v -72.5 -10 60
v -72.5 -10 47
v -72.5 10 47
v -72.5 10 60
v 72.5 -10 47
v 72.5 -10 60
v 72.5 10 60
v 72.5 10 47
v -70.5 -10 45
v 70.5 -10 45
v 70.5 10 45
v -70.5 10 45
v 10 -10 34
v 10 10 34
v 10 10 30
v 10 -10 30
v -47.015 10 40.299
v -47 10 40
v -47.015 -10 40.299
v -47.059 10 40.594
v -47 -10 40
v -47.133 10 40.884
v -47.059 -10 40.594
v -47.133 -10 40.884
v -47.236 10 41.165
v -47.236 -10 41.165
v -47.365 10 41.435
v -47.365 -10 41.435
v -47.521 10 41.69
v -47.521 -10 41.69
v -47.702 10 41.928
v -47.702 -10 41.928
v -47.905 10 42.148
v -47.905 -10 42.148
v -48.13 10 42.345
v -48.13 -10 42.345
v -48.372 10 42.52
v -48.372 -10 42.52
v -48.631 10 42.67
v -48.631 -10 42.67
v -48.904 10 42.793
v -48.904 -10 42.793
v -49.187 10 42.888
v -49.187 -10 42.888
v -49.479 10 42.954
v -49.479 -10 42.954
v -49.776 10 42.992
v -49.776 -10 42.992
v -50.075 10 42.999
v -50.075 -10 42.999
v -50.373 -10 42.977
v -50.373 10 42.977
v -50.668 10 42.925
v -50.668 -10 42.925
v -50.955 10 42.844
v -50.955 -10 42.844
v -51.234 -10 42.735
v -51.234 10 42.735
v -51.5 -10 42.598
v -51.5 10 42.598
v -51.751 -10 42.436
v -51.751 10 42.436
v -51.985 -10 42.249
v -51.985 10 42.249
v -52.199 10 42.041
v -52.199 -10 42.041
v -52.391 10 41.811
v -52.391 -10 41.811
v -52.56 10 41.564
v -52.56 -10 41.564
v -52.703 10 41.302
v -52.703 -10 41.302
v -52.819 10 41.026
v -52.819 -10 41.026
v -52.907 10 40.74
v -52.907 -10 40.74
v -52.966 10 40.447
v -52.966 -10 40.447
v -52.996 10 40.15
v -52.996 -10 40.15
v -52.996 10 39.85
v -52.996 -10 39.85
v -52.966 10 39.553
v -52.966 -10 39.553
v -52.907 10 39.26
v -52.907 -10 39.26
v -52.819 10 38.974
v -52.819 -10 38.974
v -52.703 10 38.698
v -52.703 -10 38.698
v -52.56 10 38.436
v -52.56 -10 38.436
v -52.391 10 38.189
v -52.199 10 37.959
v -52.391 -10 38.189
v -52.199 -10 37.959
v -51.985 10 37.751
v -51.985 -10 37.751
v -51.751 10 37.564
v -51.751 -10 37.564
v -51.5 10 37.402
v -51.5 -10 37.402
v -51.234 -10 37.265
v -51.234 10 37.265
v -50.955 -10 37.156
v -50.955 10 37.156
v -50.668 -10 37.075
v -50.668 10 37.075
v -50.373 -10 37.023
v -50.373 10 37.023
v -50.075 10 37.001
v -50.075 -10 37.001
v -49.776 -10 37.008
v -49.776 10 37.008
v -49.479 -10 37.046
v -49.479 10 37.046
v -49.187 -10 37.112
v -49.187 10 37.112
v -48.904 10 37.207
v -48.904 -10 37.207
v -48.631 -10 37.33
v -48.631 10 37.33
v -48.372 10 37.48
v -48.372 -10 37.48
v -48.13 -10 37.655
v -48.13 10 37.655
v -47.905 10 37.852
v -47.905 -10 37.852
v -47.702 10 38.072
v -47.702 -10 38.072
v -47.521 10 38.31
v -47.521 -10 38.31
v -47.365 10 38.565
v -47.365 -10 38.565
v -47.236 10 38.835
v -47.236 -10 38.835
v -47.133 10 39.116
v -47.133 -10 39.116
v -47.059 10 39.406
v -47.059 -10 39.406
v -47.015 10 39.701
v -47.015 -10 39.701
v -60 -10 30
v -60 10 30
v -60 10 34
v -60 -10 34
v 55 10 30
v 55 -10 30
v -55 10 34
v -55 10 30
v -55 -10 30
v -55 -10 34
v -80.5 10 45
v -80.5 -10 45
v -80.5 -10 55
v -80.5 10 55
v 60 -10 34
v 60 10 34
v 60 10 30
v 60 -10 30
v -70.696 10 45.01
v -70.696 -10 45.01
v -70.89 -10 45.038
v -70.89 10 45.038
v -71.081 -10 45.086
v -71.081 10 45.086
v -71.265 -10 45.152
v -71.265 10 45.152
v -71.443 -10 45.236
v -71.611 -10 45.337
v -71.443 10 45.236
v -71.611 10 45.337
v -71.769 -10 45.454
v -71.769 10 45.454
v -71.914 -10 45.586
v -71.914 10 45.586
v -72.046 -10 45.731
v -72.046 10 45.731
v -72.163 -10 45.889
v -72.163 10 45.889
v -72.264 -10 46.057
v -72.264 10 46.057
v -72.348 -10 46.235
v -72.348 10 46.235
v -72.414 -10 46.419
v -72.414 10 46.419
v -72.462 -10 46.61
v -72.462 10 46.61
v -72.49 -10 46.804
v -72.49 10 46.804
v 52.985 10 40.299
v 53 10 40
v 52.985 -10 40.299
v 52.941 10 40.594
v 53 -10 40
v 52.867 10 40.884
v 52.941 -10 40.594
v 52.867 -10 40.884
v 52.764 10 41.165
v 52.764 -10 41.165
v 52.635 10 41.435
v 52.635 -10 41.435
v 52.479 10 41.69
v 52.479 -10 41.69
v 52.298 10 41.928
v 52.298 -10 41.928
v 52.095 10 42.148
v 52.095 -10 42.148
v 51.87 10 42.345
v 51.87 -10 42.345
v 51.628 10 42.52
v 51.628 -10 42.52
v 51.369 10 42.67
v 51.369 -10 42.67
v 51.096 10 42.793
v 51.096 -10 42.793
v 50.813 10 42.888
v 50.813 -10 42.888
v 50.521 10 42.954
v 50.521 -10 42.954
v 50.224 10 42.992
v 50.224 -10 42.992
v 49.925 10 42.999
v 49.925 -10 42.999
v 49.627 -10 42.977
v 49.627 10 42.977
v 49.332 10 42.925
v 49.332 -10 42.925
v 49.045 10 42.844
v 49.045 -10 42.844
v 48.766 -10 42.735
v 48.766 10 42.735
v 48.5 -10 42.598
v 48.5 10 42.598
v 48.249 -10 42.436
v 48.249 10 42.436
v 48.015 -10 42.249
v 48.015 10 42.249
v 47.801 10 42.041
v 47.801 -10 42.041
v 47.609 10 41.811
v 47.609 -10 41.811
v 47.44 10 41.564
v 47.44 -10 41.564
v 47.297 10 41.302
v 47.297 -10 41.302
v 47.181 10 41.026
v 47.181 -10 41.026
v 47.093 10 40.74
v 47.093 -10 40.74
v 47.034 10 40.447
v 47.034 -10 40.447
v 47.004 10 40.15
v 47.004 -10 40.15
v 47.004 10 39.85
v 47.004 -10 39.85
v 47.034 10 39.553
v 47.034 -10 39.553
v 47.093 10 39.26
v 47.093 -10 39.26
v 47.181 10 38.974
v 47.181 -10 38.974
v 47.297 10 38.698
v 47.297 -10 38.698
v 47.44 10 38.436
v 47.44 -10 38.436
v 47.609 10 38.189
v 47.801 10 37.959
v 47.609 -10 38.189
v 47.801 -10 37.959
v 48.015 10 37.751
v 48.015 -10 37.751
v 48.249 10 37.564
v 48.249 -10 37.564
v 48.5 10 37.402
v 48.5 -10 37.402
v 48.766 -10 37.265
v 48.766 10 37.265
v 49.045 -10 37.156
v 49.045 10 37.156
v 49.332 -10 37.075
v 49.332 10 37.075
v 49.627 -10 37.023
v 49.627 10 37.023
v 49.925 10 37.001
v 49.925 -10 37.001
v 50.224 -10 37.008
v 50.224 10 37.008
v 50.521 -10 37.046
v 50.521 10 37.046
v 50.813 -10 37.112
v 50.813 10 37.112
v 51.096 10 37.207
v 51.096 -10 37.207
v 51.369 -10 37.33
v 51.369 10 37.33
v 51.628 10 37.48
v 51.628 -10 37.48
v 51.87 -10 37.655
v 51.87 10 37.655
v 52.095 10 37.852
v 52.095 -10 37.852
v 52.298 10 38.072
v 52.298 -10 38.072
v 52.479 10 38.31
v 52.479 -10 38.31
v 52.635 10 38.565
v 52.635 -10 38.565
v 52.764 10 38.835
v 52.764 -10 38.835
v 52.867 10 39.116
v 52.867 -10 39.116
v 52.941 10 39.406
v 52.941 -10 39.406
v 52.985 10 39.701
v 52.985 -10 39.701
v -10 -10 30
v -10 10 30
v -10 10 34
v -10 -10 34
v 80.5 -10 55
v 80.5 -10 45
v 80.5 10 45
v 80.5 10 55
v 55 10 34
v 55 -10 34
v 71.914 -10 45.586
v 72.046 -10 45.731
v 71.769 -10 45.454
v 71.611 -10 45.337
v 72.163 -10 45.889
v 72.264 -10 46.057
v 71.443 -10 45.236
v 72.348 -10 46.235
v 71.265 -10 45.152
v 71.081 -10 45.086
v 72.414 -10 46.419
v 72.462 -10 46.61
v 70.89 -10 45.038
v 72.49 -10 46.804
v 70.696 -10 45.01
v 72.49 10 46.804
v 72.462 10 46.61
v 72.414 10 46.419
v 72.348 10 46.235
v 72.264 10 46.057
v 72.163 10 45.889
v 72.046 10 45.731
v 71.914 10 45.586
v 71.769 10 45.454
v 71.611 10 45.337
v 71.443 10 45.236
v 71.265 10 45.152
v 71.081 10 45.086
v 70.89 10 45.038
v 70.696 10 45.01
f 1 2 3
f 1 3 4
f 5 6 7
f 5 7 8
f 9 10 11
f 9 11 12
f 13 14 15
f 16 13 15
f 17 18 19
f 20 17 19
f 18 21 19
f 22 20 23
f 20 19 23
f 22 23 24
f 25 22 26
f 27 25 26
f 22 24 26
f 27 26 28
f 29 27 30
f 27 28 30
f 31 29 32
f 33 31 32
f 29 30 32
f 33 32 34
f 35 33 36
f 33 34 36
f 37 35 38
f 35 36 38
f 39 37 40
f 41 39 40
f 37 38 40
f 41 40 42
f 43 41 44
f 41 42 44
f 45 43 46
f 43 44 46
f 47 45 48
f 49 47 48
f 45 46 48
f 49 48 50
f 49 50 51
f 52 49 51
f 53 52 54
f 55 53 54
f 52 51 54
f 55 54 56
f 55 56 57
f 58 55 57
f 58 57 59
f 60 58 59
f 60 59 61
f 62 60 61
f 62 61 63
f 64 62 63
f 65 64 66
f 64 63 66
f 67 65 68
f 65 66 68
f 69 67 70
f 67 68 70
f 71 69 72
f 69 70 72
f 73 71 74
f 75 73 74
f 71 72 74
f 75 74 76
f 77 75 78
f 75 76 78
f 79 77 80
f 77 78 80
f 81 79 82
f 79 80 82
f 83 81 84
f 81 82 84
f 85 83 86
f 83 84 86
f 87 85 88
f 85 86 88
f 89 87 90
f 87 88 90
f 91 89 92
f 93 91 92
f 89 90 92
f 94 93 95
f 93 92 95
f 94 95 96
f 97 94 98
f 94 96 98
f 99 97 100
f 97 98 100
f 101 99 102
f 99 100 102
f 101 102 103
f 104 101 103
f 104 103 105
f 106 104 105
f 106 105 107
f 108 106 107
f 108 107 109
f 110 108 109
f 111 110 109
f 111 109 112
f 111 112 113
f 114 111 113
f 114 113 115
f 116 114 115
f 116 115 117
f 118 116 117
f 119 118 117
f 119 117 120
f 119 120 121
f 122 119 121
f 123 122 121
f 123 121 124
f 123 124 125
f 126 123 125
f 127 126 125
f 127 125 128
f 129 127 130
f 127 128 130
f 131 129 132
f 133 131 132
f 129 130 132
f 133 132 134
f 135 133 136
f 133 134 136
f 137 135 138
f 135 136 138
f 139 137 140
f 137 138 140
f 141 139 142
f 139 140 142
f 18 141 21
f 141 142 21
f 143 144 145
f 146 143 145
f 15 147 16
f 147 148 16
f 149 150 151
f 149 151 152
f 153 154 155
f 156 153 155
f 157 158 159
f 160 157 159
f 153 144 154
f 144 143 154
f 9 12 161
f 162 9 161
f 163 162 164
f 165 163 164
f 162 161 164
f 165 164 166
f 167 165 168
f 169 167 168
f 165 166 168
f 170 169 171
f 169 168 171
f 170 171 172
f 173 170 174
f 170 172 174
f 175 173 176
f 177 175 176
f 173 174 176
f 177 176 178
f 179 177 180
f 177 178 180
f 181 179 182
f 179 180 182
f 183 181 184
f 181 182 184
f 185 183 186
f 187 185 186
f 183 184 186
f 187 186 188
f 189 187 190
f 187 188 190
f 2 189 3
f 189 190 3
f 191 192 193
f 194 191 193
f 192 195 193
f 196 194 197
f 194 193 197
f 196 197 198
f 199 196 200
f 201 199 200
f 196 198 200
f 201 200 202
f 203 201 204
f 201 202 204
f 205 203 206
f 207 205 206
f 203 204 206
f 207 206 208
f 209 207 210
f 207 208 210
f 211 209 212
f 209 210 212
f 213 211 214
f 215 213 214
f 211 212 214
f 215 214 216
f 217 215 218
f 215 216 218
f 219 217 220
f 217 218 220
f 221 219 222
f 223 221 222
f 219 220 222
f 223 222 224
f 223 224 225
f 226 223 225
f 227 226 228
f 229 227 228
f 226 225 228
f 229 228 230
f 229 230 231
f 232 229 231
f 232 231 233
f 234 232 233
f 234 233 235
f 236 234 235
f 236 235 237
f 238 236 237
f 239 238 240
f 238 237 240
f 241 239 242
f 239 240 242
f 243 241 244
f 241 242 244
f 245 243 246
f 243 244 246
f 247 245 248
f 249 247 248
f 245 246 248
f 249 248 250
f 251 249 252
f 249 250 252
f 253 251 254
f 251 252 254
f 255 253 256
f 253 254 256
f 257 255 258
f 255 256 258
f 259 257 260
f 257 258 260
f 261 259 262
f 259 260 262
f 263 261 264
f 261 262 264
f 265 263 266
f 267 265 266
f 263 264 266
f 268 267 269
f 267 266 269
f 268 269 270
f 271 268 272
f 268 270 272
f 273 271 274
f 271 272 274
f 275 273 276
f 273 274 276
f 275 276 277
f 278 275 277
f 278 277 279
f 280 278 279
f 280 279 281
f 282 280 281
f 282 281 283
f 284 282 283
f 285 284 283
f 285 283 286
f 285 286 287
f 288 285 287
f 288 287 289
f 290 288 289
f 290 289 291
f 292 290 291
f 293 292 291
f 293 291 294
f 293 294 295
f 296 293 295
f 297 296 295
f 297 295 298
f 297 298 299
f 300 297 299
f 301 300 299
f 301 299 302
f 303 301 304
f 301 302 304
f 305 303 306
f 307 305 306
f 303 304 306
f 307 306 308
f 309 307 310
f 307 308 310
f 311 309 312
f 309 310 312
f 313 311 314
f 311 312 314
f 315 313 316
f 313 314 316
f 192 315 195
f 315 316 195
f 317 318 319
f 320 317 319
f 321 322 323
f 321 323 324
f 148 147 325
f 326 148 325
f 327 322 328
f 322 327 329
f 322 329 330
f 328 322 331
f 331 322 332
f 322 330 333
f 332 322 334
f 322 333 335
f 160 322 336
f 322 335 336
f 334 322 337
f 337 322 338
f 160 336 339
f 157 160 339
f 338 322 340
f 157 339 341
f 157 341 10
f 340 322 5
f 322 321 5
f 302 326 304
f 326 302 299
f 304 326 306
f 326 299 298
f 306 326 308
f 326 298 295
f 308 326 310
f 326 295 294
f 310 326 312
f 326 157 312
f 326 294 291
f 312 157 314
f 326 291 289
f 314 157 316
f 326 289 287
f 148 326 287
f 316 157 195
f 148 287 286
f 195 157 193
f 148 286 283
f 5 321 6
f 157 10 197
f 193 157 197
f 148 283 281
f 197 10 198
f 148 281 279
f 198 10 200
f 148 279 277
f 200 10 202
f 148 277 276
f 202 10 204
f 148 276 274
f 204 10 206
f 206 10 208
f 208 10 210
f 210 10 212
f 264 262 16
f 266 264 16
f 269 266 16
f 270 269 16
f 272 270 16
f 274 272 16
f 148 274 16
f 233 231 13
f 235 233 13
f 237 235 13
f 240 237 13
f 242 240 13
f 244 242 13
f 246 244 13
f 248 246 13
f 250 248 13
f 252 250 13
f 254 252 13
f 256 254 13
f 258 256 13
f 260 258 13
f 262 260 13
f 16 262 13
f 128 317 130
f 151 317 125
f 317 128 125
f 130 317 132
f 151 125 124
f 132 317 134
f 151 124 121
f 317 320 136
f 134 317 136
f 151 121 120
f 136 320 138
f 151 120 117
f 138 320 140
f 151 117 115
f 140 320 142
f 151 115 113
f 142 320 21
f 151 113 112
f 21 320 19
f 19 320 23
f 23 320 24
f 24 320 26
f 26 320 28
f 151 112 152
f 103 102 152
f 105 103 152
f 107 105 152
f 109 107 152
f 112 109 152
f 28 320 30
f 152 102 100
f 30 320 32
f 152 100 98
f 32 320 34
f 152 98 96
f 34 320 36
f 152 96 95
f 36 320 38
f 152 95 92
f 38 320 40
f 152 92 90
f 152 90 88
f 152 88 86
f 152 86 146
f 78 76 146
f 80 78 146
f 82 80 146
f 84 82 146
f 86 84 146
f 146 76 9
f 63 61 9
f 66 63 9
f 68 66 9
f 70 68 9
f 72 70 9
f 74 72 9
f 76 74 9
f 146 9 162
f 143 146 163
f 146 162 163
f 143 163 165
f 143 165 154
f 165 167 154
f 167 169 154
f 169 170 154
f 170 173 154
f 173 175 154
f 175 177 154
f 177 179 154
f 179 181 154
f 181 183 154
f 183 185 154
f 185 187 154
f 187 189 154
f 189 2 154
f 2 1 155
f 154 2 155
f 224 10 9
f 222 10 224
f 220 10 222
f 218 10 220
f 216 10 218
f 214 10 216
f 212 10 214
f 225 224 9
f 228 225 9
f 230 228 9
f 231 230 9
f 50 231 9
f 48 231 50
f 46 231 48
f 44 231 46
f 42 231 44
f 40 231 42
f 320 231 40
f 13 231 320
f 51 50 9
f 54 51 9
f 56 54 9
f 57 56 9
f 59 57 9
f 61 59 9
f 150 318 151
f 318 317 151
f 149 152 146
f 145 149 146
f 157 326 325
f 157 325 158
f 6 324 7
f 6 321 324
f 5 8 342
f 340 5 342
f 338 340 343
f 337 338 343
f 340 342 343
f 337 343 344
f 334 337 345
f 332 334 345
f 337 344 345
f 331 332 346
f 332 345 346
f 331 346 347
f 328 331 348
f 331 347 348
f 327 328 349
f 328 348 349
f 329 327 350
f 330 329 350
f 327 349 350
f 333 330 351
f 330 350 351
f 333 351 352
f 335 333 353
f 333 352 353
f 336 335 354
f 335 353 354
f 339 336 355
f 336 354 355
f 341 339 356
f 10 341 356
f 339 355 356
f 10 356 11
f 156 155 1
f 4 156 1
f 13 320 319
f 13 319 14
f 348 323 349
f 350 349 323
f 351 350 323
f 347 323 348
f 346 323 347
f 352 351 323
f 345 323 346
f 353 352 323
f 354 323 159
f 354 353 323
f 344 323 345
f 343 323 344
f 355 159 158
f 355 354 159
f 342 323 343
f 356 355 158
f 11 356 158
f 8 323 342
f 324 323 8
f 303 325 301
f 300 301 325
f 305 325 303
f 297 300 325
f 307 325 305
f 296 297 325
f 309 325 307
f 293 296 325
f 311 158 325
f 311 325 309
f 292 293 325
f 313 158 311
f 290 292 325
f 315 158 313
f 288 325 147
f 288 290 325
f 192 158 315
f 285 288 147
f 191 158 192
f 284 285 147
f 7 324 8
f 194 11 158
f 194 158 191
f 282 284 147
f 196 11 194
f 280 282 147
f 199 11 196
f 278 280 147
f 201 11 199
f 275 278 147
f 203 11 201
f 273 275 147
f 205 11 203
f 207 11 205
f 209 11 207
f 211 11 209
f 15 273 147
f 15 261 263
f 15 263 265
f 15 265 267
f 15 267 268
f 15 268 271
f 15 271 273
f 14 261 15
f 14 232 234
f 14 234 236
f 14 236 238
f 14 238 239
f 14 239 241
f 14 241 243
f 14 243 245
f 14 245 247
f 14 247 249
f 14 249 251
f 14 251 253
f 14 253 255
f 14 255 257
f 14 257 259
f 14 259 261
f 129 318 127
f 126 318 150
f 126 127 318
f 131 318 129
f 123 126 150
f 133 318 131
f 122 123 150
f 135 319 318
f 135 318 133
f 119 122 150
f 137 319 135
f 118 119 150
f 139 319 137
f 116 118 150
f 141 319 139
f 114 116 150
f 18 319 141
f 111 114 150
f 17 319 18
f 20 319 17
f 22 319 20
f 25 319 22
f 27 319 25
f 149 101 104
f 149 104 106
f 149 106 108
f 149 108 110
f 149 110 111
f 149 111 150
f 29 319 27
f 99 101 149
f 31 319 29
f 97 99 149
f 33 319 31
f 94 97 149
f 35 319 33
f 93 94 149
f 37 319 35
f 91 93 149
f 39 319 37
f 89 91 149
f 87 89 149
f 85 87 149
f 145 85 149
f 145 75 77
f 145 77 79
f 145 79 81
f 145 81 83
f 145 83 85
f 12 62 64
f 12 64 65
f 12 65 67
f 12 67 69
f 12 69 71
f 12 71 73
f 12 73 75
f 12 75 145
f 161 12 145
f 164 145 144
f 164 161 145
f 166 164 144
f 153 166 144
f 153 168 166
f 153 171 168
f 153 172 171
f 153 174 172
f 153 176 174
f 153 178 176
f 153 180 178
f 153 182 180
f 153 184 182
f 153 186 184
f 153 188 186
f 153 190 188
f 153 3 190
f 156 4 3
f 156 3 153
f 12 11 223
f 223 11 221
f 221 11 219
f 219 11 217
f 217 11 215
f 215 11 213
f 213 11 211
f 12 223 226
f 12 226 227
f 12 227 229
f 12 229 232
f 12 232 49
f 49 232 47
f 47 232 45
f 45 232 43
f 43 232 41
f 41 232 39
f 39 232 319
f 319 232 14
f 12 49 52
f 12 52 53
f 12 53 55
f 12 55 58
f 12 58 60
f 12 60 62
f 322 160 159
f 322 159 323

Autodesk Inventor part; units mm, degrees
ref_plane "YZ Plane" through (0, 0, 0) normal (1, 0, 0) x (0, 1, 0)
ref_plane "XZ Plane" through (0, 0, 0) normal (0, 1, 0) x (-1, 0, 0)
ref_plane "XY Plane" through (0, 0, 0) normal (0, 0, 1) x (1, 0, 0)
sketch "Esquisse1" plane through (0, 0, 0) normal (0, 1, 0) x (-1, 0, 0)
  circle A0 centre (0, 0) radius 25 construction
  line L0 (-25, 0) -> (25, 0) construction
  arc A1 (-75, -80.7775) -> (-75, 80.7775) centre (-25, 0) ccw construction
  arc A2 (75, 80.7775) -> (75, -80.7775) centre (25, 0) ccw construction
  line L1 (0, 25) -> (0, 0) construction
  line L2 (-75, 80.7775) -> (75, 80.7775)
  line L3 (-75, -80.7775) -> (75, -80.7775)
  arc A3 (75, -80.7775) -> (75, 80.7775) centre (25, 0) ccw
  arc A4 (-75, 80.7775) -> (-75, -80.7775) centre (-25, 0) ccw
  dimension "d0" = 50
  dimension "d1" = 190
  dimension "d2" = 150
extrude "Extrusion1" add sketch "Esquisse1" along normal mid plane 20
sketch "Esquisse4" plane through (0, -10, 0) normal (0, -1, 0) x (1, 0, 0)
  line L0 (-50, 40) -> (50, 40) construction
  line L1 (50, 40) -> (50, -40) construction
  line L2 (50, -40) -> (-50, -40) construction
  line L3 (-50, -40) -> (-50, 40) construction
  circle A0 centre (-50, 40) radius 3
  circle A1 centre (50, 40) radius 3
  circle A2 centre (50, -40) radius 3
  circle A3 centre (-50, -40) radius 3
  line L4 (75, 80.7775) -> (-75, 80.7775) projected
  point P0 (0, 0)
  dimension "d15" = 80
  dimension "d16" = 100
  dimension "d17" = 50
  dimension "d18" = 40
  dimension "d19" = 6
  dimension "d20" = 6
  dimension "d21" = 6
  dimension "d22" = 6
  dimension "d25" = 40.7775
extrude "Extrusion4" cut sketch "Esquisse4" against normal through all
sketch "Esquisse12" plane through (0, -10, 0) normal (0, -1, 0) x (1, 0, 0)
  circle A0 centre (50, -40) radius 3 projected
  circle A1 centre (-50, 40) radius 3 projected
  circle A2 centre (50, 40) radius 3 projected
  circle A3 centre (-50, -40) radius 3 projected
  line L0 (75, 80.7775) -> (-75, 80.7775) projected
  arc A4 (-75, 80.7775) -> (-75, -80.7775) centre (-25, 0) ccw projected
  line L1 (-75, -80.7775) -> (75, -80.7775) projected
  arc A5 (75, -80.7775) -> (75, 80.7775) centre (25, 0) ccw projected
  line L2 (-72.5, 60) -> (72.5, 60)
  line L3 (72.5, 60) -> (72.5, 45)
  line L4 (72.5, 45) -> (-72.5, 45)
  line L5 (-72.5, 45) -> (-72.5, 60)
  line L6 (-60, 45) -> (60, 45)
  line L7 (60, 45) -> (60, 30)
  line L8 (60, 30) -> (-60, 30)
  line L9 (-60, 30) -> (-60, 45)
  line L10 (-72.5, 45) -> (-80.5, 45)
  line L11 (-80.5, 45) -> (-80.5, 55)
  line L12 (-80.5, 55) -> (-72.5, 55)
  line L13 (-72.5, 55) -> (-72.5, 45)
  line L14 (72.5, 45) -> (80.5, 45)
  line L15 (80.5, 45) -> (80.5, 55)
  line L16 (80.5, 55) -> (72.5, 55)
  line L17 (72.5, 55) -> (72.5, 45)
  line L18 (-60, 30) -> (-80.5, 45)
  line L19 (60, 30) -> (80.5, 45)
  line L20 (-80.5, 55) -> (-72.5, 60)
  line L21 (-72.5, 55) -> (-72.5, 60)
  line L22 (80.5, 55) -> (72.5, 60)
  line L23 (72.5, 60) -> (72.5, 55)
  line L24 (-60, 30) -> (-55, 30)
  line L25 (-55, 30) -> (-55, 34)
  line L26 (-55, 34) -> (-60, 34)
  line L27 (-60, 34) -> (-60, 30)
  line L28 (60, 30) -> (55, 30)
  line L29 (55, 30) -> (55, 34)
  line L30 (55, 34) -> (60, 34)
  line L31 (60, 34) -> (60, 30)
  line L32 (10, 30) -> (-10, 30)
  line L33 (-10, 30) -> (-10, 34)
  line L34 (-10, 34) -> (10, 34)
  line L35 (10, 34) -> (10, 30)
  point P0 (0, 0)
  dimension "d101" = 145
  dimension "d102" = 15
  dimension "d103" = 40.7775
  dimension "d105" = 72.5
  dimension "d106" = 10
  dimension "d107" = 10
  dimension "d108" = 10
  dimension "d109" = 8
  dimension "d110" = 8
  dimension "d111" = 5
  dimension "d112" = 5
  dimension "d116" = 5
  dimension "d117" = 4
  dimension "d118" = 5
  dimension "d119" = 4
  dimension "d120" = 4
  dimension "d121" = 20
  dimension "d122" = 10
  dimension "d144" = 5
extrude "Extrusion9" cut sketch "Esquisse12" against normal through all contours A5 L1 A4 L0 | L2 L3 L4 L5 | L9 L26 L25 L8 | L8 L29 L30 L7 | L33 L34 L35 L8
fillet "Congé1" radius 2 2 edges at (72.5, 0, 45) (-72.5, 0, 45)
equation "\"d17\" = 0.5 * d16"
equation "\"d18\" = 0.5 * d15"
equation "\"d20\" = d19"
equation "\"d21\" = d19"
equation "\"d22\" = d19"
properties part number "base"
